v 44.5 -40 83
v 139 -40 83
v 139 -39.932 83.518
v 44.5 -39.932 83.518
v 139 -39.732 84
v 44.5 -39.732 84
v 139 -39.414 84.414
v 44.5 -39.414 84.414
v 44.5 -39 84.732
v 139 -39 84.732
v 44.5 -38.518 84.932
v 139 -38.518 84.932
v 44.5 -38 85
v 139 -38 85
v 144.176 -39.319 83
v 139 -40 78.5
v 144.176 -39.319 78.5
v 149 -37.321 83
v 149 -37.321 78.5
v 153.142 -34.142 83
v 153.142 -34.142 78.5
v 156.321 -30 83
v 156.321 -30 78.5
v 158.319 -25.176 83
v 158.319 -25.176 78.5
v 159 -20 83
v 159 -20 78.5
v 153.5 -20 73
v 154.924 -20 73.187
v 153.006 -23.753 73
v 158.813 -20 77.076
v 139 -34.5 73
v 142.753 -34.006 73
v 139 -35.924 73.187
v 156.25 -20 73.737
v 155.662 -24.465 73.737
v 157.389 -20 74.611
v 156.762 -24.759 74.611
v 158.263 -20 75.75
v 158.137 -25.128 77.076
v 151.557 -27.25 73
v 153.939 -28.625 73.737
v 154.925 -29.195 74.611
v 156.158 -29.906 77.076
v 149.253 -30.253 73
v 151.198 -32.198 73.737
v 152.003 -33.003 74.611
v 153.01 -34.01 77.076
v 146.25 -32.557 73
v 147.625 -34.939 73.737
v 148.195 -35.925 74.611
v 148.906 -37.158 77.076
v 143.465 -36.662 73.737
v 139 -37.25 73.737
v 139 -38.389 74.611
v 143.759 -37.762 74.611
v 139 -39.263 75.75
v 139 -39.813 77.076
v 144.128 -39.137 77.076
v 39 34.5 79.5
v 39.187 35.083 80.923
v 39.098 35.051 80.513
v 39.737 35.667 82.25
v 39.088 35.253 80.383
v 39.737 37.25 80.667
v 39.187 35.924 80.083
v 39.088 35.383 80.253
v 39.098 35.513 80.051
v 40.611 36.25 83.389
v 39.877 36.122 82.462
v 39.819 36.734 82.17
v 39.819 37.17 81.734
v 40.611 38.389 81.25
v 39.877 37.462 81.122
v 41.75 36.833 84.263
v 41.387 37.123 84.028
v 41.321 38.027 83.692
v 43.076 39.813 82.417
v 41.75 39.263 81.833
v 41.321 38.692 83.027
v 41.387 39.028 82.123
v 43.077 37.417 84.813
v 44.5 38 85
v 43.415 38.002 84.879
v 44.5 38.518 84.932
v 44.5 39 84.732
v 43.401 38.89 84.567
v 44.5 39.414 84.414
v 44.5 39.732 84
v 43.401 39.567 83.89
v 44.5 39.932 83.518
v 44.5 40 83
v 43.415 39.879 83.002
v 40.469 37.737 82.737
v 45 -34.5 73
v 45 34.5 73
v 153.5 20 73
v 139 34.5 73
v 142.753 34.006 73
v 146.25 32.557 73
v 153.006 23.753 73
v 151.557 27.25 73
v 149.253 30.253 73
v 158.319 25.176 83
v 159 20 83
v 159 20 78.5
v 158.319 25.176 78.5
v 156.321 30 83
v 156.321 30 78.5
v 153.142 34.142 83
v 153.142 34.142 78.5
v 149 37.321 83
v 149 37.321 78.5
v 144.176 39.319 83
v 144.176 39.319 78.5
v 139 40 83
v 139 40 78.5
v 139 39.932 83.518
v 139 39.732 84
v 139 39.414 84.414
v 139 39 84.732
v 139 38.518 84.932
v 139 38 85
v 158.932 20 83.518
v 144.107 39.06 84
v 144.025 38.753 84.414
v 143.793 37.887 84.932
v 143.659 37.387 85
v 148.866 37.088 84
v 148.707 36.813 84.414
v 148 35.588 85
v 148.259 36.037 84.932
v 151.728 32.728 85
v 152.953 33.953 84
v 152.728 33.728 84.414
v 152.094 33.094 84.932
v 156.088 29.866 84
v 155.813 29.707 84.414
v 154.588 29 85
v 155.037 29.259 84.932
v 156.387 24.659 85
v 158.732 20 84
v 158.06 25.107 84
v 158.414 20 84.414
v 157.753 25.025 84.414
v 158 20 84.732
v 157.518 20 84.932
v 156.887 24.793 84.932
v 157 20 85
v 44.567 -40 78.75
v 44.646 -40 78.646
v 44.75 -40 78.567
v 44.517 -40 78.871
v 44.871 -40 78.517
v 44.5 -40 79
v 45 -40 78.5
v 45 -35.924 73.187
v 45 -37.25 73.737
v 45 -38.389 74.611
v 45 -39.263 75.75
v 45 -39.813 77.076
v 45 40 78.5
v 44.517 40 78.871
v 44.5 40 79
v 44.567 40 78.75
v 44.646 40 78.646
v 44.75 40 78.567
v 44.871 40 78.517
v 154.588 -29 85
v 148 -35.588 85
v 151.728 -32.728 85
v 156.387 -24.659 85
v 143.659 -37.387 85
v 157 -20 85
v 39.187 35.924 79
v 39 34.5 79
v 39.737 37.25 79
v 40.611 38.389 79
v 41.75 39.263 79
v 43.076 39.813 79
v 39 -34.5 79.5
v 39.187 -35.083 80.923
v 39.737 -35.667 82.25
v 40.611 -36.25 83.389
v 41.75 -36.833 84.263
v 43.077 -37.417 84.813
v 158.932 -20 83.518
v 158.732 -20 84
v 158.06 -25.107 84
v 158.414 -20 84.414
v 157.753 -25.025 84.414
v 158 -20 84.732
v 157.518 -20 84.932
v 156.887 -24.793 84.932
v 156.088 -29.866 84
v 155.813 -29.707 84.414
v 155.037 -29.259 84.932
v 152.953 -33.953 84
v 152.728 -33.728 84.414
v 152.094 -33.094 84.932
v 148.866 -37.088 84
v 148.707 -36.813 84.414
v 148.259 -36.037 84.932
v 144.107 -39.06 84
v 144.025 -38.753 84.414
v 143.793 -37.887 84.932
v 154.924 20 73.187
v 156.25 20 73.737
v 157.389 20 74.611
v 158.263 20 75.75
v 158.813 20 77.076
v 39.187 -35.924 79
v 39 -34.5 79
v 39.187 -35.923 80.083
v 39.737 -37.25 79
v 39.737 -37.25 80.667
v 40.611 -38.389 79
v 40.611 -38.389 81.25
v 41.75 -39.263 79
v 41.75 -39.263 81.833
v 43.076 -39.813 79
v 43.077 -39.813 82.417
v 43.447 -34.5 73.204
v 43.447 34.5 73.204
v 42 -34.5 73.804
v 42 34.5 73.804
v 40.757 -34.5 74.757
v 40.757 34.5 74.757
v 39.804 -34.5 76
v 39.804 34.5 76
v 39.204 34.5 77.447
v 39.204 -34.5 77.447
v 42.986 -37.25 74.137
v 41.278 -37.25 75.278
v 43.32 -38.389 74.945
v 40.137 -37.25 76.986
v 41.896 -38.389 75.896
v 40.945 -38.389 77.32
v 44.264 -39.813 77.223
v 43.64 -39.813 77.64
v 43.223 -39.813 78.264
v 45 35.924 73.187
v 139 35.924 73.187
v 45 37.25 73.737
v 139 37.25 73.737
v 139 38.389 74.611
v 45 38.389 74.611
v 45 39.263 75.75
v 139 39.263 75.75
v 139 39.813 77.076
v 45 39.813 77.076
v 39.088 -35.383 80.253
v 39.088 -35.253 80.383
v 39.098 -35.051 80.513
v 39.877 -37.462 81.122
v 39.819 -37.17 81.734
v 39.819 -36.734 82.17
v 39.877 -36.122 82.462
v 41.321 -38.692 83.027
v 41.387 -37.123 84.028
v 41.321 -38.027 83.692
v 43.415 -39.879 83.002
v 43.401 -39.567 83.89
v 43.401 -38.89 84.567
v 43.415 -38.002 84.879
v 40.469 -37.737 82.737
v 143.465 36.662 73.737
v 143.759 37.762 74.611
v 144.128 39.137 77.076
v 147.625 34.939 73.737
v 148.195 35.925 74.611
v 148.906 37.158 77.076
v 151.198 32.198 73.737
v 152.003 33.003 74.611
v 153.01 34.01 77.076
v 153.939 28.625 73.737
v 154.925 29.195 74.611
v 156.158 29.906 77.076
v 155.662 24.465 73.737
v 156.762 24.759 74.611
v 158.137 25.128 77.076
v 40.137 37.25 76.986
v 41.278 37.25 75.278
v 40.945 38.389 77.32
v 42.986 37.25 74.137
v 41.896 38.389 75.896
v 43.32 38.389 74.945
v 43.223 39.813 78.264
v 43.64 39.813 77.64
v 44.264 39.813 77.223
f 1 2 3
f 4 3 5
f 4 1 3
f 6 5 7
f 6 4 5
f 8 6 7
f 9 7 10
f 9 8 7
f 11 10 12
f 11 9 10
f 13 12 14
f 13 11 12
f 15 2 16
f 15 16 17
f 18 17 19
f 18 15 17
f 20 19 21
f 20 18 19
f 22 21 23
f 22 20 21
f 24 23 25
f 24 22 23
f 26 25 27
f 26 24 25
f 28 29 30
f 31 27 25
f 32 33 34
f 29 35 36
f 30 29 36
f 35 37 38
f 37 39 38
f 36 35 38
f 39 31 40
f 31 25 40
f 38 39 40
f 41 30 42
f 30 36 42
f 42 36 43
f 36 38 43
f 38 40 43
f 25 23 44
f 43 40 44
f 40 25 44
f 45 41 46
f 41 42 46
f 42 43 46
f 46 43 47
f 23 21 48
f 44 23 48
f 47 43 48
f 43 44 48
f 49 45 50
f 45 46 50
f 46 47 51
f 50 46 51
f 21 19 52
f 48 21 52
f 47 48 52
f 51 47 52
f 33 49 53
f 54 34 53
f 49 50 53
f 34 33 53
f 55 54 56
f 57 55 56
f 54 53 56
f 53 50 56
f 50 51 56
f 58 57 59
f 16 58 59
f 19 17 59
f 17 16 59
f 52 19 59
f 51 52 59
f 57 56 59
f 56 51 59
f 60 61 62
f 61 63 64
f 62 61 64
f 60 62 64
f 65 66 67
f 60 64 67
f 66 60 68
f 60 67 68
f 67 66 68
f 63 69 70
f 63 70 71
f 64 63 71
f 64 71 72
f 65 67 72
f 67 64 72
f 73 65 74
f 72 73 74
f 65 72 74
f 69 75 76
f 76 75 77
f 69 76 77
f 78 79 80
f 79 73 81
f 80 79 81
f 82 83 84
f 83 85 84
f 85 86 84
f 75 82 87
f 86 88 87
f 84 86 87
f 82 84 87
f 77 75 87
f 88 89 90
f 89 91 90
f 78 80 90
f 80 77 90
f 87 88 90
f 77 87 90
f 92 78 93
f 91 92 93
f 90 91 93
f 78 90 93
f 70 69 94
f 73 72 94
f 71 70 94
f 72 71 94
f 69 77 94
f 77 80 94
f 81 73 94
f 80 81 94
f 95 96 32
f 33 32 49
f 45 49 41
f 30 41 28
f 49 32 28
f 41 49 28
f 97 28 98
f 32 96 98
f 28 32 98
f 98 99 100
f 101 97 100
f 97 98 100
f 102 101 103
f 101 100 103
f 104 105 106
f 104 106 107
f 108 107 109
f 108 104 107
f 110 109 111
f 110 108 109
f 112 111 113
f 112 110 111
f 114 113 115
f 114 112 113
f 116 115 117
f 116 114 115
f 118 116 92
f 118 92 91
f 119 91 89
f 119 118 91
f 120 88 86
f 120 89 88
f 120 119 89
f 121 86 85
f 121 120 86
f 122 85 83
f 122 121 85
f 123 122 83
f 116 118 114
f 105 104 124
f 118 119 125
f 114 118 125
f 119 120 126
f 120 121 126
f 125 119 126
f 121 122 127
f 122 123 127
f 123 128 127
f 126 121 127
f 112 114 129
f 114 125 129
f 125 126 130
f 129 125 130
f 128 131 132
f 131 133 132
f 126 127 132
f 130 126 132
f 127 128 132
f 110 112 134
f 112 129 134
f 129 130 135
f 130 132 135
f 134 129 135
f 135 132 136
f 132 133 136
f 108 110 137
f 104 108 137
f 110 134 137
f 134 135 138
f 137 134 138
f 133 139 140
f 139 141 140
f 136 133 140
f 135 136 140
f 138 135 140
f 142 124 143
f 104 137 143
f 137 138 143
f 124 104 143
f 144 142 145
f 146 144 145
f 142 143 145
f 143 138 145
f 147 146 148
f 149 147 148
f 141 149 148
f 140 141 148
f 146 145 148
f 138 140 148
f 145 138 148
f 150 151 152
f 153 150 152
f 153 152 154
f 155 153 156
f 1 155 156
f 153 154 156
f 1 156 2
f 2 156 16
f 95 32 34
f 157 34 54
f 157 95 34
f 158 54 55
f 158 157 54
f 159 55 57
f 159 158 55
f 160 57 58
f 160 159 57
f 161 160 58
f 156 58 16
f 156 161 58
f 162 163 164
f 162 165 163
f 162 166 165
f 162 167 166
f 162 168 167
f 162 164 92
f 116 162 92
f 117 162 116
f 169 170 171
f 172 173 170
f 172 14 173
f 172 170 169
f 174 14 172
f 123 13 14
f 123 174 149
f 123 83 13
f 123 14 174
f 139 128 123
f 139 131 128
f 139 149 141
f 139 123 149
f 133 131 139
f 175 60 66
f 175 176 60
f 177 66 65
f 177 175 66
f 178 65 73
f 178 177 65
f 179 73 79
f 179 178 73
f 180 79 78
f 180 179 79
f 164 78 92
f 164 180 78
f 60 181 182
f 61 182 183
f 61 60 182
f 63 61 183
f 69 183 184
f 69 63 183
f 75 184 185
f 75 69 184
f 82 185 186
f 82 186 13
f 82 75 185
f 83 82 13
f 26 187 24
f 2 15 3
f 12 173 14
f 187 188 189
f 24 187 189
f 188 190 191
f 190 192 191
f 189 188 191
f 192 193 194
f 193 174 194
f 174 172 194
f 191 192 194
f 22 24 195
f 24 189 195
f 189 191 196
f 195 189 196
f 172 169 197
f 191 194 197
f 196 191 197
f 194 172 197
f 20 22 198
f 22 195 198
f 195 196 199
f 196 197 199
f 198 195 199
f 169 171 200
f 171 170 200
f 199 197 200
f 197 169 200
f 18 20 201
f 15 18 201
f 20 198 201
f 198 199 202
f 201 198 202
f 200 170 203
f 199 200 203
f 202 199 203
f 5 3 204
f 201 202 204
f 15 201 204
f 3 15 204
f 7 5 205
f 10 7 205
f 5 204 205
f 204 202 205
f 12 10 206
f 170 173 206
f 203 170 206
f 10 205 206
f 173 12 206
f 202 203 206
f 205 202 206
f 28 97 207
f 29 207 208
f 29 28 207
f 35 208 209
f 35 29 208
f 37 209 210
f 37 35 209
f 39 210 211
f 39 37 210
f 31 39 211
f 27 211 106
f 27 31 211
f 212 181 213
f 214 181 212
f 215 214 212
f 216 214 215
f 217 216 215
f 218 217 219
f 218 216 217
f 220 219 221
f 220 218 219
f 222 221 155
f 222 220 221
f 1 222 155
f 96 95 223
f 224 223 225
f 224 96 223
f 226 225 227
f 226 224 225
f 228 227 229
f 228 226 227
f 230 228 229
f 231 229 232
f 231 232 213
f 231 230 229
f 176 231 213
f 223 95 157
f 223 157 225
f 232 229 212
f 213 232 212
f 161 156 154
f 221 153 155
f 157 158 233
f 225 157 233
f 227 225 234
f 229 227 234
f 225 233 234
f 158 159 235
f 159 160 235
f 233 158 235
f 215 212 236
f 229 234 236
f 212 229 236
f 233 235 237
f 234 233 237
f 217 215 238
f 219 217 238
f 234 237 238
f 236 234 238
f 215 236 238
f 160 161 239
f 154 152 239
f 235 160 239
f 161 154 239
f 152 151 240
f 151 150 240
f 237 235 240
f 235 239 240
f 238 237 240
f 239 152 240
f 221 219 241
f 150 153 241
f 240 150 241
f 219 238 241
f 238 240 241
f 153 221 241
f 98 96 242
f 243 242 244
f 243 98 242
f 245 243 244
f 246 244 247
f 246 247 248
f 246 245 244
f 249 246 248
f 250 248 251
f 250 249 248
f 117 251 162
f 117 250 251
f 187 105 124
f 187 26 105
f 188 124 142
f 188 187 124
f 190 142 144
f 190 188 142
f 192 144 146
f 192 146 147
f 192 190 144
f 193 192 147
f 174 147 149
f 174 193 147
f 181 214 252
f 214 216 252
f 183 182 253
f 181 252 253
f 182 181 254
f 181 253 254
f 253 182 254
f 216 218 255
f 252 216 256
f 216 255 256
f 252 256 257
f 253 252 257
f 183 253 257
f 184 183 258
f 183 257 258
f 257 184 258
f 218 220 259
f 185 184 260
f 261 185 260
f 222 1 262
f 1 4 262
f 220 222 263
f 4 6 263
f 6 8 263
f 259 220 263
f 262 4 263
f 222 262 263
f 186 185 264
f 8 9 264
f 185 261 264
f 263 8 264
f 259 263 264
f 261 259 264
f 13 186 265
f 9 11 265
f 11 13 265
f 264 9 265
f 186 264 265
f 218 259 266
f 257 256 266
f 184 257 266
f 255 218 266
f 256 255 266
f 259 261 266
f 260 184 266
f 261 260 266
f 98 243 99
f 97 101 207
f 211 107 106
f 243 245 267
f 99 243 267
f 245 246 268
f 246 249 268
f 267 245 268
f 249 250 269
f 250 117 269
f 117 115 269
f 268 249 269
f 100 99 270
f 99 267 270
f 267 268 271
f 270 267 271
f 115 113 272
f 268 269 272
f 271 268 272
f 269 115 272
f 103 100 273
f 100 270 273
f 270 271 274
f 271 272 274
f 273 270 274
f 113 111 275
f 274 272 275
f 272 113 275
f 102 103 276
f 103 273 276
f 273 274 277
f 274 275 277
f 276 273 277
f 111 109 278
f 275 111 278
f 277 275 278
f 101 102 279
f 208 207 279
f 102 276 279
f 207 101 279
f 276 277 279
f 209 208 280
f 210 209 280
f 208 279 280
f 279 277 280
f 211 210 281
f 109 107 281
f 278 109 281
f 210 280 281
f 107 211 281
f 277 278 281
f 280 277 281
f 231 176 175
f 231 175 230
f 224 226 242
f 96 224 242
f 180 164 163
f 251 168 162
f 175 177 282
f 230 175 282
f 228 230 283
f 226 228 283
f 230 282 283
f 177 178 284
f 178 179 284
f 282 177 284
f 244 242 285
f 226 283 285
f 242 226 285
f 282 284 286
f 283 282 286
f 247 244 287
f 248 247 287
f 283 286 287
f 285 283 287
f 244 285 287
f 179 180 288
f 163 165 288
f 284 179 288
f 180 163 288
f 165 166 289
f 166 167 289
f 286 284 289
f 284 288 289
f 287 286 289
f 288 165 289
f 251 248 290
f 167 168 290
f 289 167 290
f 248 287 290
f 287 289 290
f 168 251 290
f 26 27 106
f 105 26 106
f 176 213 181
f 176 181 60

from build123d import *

# Parameters (mm, degrees)
BOX001001011_W     = 120
BOX001001011_H     = 80
BOX001001011_DEPTH = 12
FILLET003002007_R  = 20
FILLET003002008_R  = 20
FILLET003002009_R  = 6
FILLET003002010_R  = 2
FILLET003002011_R  = 5.5


with BuildPart() as part:
    # Box001001011 → Box001001011 (new body)
    with BuildSketch(Plane(origin=(39, -40, 73), x_dir=(1, 0, 0), z_dir=(0, 0, 1))):
        with Locations((60, 40)):
            Rectangle(BOX001001011_W, BOX001001011_H)
    extrude(amount=BOX001001011_DEPTH)

    # Fillet003002007
    fillet003002007_edges = [part.edges().sort_by_distance(p)[0] for p in [
        (159, -40, 79),
    ]]
    fillet(fillet003002007_edges, radius=FILLET003002007_R)

    # Fillet003002008
    fillet003002008_edges = [part.edges().sort_by_distance(p)[0] for p in [
        (159, 40, 79),
    ]]
    fillet(fillet003002008_edges, radius=FILLET003002008_R)

    # Fillet003002009
    fillet003002009_edges = [part.edges().sort_by_distance(p)[0] for p in [
        (39, 0, 73),
    ]]
    fillet(fillet003002009_edges, radius=FILLET003002009_R)

    # Fillet003002010
    fillet003002010_edges = [part.edges().sort_by_distance(p)[0] for p in [
        (89, 40, 85),
    ]]
    fillet(fillet003002010_edges, radius=FILLET003002010_R)

    # Fillet003002011
    fillet003002011_edges = [part.edges().sort_by_distance(p)[0] for p in [
        (39, 0, 85),
    ]]
    fillet(fillet003002011_edges, radius=FILLET003002011_R)


solid = part.part
